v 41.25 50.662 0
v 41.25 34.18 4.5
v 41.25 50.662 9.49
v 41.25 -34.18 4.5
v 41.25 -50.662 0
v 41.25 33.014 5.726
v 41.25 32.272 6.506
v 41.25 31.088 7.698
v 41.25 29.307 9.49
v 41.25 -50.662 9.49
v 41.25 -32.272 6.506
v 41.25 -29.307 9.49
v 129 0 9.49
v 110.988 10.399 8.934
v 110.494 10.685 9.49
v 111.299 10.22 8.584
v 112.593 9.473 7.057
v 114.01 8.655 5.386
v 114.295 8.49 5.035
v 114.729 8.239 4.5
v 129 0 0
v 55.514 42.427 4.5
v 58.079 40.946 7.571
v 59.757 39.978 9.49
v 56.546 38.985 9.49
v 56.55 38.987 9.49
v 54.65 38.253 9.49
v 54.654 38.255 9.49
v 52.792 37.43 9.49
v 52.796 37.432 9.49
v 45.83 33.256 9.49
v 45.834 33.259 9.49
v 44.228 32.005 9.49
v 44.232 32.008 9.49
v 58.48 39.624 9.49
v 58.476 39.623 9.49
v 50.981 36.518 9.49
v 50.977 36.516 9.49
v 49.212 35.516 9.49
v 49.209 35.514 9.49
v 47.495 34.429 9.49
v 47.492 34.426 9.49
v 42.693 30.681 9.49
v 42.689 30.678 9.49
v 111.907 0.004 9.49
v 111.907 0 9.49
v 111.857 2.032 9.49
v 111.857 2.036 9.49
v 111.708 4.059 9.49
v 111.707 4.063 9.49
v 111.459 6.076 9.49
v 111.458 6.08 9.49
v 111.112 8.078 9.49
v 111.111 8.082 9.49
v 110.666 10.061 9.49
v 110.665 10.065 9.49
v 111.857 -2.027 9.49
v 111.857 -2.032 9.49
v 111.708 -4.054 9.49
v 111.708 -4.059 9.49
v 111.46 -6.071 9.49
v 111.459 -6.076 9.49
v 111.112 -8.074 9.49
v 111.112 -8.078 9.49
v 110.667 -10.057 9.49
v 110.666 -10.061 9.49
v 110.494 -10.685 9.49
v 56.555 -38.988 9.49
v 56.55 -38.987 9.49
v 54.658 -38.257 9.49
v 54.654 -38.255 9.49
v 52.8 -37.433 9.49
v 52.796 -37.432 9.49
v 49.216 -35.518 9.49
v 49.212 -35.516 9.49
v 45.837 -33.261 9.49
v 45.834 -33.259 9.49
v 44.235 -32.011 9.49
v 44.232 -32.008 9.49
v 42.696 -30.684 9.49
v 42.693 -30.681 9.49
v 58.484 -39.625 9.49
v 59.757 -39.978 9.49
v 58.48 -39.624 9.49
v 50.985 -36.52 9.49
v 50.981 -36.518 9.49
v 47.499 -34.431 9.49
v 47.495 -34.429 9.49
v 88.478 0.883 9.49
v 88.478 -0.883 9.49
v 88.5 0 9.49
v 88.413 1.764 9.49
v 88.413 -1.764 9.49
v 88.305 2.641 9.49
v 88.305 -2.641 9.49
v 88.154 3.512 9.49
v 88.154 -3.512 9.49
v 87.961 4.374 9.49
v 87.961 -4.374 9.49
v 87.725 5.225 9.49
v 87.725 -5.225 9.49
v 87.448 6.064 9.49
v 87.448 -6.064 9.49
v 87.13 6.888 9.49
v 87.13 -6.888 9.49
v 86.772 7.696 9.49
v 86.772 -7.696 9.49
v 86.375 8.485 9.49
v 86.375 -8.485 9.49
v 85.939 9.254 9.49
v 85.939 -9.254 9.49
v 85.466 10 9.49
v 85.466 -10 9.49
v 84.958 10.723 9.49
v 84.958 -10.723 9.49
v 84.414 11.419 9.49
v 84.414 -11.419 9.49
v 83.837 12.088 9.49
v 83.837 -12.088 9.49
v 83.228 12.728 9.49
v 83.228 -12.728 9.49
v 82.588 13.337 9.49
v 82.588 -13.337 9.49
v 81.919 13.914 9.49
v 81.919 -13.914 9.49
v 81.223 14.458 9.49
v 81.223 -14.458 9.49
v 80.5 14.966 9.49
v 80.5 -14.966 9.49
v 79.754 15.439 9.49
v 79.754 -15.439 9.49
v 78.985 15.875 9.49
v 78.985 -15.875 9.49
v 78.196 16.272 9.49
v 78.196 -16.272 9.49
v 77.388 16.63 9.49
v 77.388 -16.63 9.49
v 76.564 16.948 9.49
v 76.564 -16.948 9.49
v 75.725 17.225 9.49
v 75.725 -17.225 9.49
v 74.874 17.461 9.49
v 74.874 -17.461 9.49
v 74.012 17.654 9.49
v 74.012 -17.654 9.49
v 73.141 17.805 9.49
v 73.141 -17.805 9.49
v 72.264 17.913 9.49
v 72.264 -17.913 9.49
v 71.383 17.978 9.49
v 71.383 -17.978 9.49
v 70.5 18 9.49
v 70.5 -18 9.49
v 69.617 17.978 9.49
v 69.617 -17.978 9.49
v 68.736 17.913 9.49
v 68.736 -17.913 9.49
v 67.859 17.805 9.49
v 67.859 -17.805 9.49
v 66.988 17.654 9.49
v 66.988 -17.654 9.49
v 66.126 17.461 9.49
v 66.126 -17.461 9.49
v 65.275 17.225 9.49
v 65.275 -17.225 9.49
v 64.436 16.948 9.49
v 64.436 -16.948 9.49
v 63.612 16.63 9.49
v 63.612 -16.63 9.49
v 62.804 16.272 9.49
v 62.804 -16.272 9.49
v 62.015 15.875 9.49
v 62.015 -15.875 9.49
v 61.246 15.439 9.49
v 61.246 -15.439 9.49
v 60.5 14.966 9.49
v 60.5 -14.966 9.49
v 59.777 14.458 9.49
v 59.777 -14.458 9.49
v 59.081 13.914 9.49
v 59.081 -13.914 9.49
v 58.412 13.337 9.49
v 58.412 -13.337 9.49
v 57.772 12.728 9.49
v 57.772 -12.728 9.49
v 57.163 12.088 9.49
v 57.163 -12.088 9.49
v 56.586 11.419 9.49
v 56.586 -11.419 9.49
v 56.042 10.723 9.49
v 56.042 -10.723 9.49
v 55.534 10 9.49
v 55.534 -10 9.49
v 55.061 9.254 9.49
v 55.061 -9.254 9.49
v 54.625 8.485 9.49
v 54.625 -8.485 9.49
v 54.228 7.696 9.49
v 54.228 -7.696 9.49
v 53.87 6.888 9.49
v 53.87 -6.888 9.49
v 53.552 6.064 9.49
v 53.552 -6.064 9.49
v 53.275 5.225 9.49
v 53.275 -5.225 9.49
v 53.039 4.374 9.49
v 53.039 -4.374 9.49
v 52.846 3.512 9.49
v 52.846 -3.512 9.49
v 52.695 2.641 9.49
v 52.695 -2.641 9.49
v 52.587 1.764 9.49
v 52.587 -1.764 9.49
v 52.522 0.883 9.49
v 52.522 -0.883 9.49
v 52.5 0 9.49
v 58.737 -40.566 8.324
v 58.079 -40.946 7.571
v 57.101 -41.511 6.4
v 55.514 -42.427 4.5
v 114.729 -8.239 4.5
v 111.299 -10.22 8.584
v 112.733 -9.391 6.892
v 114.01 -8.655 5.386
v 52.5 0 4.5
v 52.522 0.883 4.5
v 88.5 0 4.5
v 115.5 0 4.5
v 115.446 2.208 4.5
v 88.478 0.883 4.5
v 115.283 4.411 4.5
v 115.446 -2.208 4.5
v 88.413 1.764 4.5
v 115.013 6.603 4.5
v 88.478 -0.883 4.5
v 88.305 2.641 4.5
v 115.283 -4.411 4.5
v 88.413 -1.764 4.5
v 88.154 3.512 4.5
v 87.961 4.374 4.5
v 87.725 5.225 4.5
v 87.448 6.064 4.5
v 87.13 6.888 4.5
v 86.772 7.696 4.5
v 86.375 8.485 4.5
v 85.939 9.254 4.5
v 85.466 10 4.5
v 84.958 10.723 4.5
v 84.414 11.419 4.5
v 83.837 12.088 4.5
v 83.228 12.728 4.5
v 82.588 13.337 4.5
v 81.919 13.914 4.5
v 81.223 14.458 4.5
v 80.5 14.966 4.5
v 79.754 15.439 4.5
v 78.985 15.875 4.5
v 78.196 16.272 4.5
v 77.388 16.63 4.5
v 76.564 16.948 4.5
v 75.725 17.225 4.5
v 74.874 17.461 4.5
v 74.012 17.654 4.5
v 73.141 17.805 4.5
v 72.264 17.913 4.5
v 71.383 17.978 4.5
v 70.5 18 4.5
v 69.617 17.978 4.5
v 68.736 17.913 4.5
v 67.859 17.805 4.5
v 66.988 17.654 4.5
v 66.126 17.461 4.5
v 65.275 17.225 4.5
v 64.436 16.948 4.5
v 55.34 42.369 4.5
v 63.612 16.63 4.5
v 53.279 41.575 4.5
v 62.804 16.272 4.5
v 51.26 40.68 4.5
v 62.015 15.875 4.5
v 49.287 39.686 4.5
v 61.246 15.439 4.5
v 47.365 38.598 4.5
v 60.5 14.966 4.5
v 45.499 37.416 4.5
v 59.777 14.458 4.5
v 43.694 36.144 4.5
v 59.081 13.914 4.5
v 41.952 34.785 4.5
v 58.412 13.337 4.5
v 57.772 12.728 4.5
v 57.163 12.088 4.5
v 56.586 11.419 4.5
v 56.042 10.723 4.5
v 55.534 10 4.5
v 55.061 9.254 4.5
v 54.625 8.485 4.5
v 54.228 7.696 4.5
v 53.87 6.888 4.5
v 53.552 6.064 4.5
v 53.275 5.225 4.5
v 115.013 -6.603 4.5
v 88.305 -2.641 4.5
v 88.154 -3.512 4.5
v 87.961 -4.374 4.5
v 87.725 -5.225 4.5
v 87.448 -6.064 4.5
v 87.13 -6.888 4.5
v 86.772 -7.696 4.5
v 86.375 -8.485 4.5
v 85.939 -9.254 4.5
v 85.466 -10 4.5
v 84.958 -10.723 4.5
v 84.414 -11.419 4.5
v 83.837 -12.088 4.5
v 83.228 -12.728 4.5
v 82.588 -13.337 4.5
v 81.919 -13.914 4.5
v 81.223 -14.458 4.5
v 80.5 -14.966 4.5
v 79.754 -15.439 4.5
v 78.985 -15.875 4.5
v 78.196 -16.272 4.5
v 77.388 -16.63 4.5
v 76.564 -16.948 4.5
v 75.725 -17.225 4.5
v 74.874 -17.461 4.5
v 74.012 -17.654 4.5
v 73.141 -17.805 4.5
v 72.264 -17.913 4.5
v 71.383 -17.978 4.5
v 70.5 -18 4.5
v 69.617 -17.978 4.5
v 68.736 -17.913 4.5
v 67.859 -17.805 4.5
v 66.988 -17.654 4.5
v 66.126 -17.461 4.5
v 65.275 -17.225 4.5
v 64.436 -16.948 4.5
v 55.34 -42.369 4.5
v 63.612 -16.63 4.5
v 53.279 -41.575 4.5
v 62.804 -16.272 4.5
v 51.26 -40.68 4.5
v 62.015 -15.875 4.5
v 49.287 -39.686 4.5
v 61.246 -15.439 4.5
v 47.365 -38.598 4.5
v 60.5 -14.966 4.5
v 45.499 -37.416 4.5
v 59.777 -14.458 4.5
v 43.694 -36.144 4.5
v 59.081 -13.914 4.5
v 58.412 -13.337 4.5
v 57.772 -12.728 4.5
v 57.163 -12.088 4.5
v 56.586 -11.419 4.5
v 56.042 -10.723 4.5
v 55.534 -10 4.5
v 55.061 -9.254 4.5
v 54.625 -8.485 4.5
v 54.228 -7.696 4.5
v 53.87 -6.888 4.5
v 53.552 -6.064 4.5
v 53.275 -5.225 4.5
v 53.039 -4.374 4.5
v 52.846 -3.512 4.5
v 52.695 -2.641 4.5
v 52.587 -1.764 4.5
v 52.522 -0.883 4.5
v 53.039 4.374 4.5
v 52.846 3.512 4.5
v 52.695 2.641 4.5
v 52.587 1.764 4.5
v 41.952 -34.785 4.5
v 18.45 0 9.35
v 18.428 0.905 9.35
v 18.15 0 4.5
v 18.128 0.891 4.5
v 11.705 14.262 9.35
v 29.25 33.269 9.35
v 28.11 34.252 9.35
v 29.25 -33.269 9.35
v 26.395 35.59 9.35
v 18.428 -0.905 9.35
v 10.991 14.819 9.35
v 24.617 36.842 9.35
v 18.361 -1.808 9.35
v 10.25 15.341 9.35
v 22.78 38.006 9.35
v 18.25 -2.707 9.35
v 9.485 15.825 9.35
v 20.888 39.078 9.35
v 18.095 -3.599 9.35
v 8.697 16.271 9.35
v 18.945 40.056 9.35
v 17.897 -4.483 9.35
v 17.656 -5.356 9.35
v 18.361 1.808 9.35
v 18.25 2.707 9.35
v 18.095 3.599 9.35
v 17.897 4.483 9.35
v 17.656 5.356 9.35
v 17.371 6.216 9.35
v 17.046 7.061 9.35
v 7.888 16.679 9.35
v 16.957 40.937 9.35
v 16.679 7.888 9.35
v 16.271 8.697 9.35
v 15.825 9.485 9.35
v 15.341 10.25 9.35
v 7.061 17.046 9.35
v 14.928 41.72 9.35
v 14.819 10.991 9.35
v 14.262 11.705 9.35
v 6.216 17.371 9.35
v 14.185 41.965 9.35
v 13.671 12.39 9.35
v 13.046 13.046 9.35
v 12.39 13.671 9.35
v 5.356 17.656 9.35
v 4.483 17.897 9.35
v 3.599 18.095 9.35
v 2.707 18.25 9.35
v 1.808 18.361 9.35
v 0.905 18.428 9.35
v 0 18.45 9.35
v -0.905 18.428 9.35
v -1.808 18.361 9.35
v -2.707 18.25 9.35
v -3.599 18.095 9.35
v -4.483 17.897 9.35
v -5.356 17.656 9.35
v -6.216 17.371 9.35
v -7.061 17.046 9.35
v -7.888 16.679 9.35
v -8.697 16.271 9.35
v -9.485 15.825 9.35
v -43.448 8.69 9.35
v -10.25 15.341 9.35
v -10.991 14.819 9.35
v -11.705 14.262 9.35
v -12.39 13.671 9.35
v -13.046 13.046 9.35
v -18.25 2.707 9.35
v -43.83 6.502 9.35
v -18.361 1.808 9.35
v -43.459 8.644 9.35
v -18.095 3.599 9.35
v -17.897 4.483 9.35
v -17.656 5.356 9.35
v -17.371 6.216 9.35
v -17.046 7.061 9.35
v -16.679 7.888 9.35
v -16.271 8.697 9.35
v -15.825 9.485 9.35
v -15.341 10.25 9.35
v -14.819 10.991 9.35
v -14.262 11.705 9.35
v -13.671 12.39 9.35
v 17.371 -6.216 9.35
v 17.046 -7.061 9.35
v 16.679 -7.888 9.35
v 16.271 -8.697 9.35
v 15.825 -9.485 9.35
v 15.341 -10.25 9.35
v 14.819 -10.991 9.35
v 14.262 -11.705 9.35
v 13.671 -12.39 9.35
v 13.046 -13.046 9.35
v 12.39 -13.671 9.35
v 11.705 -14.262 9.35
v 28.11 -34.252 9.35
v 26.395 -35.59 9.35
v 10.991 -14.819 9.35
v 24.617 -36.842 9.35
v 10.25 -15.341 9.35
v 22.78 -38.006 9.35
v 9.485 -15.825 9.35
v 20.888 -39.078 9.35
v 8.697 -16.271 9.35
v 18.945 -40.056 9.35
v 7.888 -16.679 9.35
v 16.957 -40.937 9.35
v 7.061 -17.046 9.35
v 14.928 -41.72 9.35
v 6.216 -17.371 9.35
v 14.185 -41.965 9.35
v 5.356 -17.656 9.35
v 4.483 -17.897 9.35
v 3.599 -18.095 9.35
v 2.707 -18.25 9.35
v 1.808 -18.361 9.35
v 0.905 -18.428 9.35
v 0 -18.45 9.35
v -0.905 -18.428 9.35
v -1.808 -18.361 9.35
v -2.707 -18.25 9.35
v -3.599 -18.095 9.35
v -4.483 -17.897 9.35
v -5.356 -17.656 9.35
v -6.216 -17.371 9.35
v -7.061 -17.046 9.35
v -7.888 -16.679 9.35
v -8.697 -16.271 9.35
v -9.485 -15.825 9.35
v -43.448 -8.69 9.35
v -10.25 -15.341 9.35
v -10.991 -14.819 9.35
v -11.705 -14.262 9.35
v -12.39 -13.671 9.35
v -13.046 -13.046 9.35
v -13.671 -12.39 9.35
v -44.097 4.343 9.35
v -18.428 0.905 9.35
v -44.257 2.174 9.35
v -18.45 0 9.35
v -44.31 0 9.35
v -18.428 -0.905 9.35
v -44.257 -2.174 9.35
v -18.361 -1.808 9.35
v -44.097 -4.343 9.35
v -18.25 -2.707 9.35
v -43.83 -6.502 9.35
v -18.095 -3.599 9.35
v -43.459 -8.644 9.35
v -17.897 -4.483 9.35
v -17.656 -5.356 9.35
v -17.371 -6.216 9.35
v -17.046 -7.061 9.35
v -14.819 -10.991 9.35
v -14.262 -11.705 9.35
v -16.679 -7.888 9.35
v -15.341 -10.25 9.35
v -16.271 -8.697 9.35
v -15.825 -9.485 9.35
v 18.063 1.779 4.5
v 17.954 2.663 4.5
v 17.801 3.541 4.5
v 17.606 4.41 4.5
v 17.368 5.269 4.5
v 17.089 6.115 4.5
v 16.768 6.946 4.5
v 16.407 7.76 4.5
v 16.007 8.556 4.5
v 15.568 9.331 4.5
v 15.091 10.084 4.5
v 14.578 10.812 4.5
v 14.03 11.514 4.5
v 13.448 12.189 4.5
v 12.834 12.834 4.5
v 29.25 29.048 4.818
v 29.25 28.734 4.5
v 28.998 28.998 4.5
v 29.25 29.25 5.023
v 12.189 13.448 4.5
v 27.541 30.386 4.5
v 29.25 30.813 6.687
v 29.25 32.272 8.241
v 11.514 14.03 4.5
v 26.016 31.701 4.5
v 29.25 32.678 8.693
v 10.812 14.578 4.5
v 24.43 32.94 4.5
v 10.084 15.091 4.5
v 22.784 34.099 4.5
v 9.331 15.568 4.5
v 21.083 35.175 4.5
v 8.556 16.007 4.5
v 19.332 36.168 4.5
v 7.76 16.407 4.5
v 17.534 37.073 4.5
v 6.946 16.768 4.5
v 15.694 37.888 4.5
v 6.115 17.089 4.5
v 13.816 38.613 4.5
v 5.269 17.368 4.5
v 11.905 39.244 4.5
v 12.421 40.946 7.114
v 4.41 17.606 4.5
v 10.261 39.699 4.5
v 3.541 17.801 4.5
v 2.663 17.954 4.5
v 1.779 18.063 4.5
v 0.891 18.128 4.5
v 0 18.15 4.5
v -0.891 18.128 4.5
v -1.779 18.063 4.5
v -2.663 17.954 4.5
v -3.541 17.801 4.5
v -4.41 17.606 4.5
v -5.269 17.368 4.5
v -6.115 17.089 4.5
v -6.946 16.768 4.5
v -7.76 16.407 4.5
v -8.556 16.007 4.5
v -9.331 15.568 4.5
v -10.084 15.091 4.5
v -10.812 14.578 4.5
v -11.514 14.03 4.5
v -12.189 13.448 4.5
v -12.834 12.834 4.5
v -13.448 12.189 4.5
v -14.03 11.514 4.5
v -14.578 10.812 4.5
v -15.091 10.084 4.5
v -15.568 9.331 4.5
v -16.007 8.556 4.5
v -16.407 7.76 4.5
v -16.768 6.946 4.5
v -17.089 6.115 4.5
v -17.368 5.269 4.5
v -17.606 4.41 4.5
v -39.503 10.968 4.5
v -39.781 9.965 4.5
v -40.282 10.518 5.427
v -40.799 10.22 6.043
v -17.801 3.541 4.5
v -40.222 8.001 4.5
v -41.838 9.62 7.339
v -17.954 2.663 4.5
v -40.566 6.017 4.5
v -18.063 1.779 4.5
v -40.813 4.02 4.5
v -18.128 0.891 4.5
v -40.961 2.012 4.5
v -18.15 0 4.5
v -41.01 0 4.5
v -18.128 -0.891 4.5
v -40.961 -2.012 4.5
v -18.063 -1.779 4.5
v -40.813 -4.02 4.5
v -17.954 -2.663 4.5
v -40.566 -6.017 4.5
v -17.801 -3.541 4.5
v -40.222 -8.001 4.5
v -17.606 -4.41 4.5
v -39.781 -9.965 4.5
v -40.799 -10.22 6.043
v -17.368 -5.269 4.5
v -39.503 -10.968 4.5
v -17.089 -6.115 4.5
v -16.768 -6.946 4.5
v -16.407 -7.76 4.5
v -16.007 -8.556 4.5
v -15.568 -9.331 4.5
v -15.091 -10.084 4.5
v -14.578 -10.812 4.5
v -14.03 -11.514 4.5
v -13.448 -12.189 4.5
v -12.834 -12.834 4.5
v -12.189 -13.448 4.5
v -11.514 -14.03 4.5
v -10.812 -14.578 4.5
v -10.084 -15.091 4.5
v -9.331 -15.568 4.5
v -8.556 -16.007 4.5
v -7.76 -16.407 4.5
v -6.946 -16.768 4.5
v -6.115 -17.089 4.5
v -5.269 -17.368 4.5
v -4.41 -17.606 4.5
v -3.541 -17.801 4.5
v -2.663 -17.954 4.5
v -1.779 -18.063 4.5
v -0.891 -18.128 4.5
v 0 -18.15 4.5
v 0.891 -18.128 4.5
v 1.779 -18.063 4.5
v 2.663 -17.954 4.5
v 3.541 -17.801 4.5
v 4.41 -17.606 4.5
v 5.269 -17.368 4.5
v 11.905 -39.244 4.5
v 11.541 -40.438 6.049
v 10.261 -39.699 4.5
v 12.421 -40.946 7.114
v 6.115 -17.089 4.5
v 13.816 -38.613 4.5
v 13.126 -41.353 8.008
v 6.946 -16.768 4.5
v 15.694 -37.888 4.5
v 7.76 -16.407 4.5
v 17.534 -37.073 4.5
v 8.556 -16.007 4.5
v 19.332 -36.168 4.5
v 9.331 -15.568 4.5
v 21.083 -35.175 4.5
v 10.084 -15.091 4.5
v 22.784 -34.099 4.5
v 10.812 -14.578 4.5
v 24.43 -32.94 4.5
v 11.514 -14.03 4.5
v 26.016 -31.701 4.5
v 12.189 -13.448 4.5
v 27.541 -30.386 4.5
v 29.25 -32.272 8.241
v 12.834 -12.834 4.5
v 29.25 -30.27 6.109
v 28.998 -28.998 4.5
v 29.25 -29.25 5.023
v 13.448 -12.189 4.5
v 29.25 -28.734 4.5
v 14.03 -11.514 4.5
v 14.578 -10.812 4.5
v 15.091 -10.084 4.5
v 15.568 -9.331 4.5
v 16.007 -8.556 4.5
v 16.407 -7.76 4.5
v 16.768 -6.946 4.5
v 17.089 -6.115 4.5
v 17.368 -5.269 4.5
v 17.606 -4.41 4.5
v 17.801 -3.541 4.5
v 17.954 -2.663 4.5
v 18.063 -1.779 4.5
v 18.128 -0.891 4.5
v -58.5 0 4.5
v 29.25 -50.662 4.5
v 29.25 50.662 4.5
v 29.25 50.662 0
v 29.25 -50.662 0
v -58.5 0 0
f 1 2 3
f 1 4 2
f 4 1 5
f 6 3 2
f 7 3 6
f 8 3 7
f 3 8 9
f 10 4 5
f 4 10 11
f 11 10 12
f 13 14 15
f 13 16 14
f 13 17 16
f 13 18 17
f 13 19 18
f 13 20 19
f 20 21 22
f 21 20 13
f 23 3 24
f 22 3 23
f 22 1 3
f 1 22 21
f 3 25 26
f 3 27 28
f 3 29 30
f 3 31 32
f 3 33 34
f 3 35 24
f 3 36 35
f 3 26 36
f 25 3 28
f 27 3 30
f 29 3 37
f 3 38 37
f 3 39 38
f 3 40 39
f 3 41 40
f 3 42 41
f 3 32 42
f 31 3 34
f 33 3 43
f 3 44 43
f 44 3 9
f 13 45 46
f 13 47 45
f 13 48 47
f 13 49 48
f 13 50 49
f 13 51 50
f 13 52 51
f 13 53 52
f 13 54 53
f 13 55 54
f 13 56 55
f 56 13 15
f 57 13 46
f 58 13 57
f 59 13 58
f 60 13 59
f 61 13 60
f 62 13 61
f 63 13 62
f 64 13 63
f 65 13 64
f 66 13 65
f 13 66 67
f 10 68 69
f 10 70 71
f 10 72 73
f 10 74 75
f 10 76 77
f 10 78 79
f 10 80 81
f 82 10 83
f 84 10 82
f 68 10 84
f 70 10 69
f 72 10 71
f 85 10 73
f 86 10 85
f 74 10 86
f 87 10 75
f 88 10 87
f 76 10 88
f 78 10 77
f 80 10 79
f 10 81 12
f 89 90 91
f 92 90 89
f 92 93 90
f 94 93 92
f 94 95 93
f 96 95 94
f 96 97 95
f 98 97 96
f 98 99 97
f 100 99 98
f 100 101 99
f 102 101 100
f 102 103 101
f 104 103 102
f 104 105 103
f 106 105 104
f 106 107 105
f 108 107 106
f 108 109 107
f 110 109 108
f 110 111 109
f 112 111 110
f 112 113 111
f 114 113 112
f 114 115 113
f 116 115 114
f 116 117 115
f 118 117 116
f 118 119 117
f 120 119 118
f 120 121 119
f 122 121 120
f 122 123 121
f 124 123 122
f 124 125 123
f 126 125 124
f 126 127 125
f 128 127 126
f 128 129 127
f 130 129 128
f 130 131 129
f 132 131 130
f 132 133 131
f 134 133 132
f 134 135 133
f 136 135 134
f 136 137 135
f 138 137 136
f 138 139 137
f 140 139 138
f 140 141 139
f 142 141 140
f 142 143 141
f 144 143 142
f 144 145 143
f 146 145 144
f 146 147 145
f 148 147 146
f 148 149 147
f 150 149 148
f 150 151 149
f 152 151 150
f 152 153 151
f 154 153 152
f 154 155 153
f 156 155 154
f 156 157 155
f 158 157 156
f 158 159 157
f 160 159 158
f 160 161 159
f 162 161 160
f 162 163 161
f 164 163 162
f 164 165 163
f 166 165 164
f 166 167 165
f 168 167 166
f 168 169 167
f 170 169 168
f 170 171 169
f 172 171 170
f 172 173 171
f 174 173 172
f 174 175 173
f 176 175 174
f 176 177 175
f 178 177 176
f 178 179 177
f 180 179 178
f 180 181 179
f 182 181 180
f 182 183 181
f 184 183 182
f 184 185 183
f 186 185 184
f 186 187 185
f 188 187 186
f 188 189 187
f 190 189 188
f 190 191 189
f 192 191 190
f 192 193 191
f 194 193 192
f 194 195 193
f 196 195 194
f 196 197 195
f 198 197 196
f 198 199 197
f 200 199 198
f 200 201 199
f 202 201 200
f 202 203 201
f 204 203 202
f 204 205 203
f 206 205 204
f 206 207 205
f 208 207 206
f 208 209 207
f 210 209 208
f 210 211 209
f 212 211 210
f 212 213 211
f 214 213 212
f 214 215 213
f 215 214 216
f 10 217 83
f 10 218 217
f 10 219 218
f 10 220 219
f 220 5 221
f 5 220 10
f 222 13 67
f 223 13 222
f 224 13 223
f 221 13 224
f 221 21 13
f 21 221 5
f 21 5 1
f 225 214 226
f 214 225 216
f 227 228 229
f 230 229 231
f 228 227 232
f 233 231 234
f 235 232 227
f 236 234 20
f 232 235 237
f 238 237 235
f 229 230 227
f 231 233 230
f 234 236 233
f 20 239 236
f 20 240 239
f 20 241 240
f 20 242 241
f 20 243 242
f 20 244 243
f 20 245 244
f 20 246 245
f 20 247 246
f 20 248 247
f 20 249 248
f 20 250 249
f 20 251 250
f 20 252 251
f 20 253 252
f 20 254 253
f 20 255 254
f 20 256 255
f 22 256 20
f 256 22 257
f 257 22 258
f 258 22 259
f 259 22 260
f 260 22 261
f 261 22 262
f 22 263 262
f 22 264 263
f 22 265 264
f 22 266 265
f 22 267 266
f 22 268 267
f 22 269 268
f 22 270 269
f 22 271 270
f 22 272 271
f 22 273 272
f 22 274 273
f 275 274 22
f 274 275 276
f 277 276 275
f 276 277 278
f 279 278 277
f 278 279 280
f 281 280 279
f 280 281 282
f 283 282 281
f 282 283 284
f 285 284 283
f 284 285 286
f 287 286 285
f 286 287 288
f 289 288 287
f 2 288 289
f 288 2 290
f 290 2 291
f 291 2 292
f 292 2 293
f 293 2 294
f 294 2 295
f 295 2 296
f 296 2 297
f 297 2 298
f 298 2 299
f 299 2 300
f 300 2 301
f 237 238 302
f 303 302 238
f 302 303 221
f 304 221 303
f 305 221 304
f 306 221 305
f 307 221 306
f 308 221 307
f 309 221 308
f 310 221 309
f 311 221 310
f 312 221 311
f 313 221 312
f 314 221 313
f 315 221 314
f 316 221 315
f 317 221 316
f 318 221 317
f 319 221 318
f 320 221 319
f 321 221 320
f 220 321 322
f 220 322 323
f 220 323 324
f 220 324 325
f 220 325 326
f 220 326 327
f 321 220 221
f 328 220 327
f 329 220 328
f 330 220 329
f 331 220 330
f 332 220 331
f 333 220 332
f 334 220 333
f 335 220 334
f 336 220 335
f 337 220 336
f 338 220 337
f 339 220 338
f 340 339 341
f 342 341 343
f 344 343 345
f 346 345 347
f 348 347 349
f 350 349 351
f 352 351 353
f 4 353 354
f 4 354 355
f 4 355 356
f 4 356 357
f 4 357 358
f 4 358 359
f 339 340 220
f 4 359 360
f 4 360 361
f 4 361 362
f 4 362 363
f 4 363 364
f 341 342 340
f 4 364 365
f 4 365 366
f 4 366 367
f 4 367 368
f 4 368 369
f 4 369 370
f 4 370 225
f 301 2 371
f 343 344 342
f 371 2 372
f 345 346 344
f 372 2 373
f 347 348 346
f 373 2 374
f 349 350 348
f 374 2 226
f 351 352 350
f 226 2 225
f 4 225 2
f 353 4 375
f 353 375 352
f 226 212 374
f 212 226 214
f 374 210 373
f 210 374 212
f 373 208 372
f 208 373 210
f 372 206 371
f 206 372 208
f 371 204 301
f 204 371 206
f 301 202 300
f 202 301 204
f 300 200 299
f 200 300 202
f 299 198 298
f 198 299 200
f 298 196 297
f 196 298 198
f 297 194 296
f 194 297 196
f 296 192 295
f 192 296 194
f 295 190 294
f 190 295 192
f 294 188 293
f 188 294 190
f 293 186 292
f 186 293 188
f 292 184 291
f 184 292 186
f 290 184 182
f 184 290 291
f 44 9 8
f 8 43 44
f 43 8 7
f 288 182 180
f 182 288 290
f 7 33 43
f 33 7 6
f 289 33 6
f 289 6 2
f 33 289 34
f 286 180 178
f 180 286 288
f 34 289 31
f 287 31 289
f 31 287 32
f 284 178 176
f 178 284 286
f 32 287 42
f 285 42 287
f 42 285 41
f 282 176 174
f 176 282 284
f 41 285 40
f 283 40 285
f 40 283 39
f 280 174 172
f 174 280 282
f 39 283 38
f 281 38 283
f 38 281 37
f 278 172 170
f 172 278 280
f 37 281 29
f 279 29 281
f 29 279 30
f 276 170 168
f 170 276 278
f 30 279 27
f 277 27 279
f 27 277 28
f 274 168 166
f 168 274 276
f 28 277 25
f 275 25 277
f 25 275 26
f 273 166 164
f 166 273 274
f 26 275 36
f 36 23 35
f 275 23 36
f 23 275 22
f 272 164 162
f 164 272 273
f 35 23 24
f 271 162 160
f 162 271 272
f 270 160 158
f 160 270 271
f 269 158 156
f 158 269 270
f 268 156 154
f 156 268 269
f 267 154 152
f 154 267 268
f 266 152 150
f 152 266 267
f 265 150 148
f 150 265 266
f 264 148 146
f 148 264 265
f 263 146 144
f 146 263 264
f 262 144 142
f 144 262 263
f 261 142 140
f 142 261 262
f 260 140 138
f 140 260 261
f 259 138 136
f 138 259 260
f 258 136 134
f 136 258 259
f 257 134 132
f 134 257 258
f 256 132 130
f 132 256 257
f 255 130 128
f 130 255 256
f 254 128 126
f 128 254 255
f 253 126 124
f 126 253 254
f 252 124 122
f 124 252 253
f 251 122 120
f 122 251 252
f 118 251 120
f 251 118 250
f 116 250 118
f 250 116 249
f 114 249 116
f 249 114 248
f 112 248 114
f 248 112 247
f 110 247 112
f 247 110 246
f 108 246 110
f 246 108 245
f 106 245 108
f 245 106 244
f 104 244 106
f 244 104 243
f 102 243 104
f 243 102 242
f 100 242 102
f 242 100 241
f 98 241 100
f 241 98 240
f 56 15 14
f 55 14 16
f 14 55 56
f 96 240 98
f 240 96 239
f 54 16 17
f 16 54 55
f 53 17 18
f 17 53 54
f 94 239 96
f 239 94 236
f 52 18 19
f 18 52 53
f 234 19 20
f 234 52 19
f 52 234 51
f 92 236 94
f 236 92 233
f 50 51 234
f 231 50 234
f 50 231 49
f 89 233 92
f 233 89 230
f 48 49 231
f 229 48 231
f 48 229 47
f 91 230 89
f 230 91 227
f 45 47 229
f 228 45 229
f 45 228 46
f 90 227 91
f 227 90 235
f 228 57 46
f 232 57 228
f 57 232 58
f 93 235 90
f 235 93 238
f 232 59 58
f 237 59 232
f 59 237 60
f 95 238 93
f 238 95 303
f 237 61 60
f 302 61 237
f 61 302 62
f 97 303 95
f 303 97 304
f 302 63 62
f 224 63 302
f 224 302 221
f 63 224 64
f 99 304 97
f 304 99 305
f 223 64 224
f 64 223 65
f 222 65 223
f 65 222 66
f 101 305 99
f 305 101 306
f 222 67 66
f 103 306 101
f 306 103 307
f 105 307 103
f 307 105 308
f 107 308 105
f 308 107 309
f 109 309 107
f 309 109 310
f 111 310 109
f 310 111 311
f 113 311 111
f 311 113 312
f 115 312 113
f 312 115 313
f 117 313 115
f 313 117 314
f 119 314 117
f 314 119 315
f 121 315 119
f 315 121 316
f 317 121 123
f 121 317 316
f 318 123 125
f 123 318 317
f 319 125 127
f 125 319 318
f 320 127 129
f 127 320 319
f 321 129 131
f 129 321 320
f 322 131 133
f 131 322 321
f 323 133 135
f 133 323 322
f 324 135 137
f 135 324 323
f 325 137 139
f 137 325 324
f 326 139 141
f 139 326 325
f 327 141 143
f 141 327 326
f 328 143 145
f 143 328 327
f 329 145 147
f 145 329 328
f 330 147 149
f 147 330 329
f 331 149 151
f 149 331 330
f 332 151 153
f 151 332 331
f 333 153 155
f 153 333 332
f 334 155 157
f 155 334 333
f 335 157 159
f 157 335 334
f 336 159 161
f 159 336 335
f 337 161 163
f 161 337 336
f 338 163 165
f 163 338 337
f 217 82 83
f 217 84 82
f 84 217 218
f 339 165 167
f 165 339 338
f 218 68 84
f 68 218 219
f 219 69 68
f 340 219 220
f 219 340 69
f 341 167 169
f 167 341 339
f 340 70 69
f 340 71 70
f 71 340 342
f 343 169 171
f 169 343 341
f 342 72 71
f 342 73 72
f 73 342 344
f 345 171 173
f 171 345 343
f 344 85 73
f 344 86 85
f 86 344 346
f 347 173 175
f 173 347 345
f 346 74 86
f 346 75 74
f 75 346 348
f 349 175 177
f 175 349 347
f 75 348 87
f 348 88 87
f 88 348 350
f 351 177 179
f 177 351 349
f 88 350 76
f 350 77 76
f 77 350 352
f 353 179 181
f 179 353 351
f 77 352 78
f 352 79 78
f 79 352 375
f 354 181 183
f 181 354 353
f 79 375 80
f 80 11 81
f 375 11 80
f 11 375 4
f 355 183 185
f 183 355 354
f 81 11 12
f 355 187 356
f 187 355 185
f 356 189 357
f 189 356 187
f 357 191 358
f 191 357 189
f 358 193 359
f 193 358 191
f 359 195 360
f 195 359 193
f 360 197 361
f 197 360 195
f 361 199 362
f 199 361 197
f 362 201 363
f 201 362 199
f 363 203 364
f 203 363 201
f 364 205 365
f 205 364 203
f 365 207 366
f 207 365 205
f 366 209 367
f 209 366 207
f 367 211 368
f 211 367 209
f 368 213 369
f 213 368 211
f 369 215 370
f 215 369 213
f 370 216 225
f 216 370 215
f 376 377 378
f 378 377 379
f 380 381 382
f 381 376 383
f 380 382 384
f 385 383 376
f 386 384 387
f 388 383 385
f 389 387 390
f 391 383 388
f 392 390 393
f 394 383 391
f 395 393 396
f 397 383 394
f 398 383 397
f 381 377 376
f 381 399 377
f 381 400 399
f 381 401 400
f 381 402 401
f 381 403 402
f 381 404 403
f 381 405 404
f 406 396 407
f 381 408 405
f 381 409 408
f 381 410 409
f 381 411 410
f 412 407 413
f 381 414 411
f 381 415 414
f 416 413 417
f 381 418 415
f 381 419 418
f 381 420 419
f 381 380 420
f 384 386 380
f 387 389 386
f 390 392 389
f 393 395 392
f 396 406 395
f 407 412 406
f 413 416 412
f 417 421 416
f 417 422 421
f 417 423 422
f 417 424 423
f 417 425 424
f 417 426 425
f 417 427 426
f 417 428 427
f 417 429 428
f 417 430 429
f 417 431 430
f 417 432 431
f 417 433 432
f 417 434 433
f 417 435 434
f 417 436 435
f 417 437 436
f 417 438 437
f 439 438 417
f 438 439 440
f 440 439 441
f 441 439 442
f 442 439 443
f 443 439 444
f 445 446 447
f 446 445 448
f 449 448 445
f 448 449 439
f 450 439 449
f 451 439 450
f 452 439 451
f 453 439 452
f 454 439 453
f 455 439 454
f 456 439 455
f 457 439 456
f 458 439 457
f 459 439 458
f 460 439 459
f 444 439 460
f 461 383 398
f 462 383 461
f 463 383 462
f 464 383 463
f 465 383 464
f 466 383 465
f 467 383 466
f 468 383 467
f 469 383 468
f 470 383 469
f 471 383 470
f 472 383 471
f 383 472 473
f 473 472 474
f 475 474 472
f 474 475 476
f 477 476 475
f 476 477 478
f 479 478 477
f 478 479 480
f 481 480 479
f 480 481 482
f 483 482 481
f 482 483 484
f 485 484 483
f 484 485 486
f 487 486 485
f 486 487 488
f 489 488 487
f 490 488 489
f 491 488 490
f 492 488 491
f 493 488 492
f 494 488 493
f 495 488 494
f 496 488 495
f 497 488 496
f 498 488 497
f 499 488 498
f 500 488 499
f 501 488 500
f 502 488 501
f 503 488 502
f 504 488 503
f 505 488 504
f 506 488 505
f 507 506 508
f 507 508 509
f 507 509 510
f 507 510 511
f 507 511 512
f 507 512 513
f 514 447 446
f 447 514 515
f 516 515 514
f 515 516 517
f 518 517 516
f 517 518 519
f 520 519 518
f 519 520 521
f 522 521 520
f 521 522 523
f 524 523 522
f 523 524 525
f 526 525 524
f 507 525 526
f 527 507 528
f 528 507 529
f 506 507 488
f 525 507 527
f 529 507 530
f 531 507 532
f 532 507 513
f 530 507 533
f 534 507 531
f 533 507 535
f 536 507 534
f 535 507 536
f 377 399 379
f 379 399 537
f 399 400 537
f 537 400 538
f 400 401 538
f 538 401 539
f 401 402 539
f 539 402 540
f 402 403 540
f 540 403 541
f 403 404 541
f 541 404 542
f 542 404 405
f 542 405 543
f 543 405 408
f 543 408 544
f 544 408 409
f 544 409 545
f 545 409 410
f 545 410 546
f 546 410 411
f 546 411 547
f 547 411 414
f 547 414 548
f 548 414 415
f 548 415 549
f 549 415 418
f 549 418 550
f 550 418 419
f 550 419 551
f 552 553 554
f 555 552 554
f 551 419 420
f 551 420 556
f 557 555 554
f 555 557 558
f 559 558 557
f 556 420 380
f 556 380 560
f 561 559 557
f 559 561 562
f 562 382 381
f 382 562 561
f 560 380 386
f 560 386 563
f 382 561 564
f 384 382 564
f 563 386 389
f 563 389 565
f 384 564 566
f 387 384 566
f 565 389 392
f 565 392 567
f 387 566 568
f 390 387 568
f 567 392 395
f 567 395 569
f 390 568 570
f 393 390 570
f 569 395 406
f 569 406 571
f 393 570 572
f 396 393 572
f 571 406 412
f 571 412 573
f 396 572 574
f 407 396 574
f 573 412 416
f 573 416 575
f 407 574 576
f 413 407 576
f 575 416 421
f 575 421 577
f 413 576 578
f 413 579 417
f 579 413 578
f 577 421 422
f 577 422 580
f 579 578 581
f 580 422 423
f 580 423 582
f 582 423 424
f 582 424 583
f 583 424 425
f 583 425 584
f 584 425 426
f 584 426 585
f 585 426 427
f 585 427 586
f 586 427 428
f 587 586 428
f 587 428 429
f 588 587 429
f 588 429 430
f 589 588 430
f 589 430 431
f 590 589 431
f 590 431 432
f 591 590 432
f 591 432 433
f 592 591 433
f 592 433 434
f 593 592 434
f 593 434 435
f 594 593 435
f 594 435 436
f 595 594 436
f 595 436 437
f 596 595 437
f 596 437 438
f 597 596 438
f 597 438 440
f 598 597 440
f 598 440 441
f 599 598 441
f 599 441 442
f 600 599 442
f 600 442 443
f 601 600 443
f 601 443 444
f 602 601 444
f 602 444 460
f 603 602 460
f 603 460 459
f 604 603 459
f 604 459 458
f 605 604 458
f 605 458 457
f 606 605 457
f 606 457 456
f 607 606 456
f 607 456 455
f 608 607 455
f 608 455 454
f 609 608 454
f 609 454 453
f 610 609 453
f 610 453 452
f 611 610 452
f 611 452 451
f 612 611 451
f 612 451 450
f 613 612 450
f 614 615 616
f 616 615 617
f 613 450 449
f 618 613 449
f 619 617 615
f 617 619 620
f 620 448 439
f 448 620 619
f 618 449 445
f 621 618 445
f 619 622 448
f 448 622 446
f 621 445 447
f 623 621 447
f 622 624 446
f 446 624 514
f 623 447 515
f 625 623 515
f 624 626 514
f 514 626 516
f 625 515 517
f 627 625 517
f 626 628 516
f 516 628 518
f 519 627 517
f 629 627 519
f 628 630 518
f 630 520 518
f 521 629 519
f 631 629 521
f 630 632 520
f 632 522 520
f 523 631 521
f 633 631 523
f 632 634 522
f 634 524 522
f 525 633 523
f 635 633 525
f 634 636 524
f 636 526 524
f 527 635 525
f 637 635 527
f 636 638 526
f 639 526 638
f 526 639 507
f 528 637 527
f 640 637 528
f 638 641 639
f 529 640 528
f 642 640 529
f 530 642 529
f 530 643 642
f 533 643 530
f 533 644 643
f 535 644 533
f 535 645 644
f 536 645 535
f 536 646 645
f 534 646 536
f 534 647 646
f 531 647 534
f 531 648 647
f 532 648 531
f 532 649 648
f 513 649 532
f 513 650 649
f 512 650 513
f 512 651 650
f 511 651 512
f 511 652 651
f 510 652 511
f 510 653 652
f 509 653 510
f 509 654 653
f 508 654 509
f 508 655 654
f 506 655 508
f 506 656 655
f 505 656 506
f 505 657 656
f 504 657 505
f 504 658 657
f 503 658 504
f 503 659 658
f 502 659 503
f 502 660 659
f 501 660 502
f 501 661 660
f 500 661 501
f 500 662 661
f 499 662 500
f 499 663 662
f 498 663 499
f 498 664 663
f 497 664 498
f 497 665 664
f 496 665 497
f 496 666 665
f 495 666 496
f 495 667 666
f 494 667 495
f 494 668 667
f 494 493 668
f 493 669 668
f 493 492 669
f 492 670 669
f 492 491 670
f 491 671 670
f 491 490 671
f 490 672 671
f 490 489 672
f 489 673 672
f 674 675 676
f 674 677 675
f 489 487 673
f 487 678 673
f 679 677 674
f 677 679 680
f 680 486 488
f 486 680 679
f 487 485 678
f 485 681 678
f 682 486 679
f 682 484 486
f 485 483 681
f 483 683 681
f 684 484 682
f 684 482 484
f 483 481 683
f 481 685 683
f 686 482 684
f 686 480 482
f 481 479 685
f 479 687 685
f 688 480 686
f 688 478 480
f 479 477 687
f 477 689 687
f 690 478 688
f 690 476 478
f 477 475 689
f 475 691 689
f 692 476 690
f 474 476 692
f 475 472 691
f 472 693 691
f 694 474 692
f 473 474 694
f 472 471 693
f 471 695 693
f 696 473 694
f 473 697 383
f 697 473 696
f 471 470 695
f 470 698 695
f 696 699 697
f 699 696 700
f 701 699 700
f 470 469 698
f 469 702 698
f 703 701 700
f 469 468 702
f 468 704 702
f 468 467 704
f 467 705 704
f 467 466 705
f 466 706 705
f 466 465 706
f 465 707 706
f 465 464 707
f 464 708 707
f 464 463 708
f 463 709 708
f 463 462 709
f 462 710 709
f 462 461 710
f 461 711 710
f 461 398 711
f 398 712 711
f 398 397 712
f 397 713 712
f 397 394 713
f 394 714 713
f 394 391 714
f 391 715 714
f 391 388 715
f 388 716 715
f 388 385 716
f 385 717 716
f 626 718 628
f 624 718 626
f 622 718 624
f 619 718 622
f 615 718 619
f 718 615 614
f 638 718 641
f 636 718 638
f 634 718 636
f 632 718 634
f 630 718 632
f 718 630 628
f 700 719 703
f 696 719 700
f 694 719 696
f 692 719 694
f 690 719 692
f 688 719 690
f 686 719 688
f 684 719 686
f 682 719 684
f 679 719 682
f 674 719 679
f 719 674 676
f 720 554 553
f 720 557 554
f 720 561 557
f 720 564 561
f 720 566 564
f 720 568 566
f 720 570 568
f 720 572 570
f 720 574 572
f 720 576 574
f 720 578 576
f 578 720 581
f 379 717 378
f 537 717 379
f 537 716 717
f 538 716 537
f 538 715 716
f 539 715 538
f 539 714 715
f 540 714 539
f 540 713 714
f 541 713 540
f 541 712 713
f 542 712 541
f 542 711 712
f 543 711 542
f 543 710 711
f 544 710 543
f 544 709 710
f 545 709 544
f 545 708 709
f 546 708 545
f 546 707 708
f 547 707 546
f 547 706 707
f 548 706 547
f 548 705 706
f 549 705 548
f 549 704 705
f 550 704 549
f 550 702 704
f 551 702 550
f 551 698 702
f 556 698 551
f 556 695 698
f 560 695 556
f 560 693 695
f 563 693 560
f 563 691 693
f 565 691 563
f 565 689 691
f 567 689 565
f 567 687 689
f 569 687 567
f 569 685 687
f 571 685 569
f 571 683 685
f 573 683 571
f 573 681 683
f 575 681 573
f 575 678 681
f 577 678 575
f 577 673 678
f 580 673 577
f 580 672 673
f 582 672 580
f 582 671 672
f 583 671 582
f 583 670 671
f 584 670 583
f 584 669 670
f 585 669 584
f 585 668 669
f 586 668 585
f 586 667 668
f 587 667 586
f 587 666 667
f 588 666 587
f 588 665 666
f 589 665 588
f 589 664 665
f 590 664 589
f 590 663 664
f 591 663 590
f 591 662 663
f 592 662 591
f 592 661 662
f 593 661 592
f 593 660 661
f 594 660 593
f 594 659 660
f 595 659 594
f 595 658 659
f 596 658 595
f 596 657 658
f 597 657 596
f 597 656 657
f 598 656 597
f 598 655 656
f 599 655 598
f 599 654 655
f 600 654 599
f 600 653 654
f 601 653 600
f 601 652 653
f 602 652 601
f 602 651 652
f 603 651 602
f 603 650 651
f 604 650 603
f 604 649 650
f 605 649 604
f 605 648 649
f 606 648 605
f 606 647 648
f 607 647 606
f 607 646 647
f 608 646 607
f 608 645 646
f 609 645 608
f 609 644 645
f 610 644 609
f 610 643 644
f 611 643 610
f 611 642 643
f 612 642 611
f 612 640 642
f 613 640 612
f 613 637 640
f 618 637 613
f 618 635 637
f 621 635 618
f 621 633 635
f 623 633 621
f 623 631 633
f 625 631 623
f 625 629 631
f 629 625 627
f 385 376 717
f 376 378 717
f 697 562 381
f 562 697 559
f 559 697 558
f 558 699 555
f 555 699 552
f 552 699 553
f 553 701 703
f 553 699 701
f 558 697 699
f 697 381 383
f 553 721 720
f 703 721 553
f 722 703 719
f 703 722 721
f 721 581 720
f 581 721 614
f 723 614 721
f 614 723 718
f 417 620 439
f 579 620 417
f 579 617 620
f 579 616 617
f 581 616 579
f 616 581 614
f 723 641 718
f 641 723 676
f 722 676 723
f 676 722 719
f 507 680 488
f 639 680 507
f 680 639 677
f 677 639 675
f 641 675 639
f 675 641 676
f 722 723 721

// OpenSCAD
triangle_height = 14;
f = 1.8;

dove_inner_r = 10*f;
dove_h = 5;
dove_lower_w = 15*f;
dove_upper_w = 11*f;

module dove_ring(gap=0) {
        let( pts = [
         [0+dove_inner_r+gap+gap*0.5,                   gap*0.5],
         [dove_lower_w+dove_inner_r-gap-gap*1.3,    gap*0.5],
         /*[dove_lower_w-(dove_lower_w-dove_upper_w)/2+dove_inner_r-gap, dove_h-gap],*/
         [dove_lower_w-(dove_lower_w-dove_upper_w)/2+dove_inner_r-gap*1.3, dove_h],
         [0+dove_inner_r+gap*0.5, dove_h]
        ]) {
        //translate([0,0,gap])
        rotate_extrude(convexity = 10, $fn = 128)
            polygon(pts);
        }
}

module upper_triangle() {
    intersection() {
        dove_ring(0.3);
        cylinder(h=dove_h, r=dove_inner_r+dove_lower_w*1.5, $fn=3);
    }
    
    translate([0,0,dove_h])
    cylinder(h=(triangle_height-dove_h)/2, r=dove_inner_r+dove_lower_w*1.5, $fn=3);
}

module lower_triangle() {
    difference() {
        cylinder(h=(triangle_height-dove_h)/2+dove_h-0.01, r=dove_inner_r+dove_lower_w*1.5, $fn=3);
        translate([0,0,(triangle_height-dove_h)/2])
        dove_ring(0);
    }
}

/*
translate([0,0,(triangle_height-dove_h)/2])
upper_triangle();
lower_triangle();
*/

translate([dove_inner_r+dove_lower_w*1.5+12, 0, 0])
lower_triangle();
translate([0,0,(triangle_height-dove_h)/2+dove_h])
rotate([0,180,0])
upper_triangle();
